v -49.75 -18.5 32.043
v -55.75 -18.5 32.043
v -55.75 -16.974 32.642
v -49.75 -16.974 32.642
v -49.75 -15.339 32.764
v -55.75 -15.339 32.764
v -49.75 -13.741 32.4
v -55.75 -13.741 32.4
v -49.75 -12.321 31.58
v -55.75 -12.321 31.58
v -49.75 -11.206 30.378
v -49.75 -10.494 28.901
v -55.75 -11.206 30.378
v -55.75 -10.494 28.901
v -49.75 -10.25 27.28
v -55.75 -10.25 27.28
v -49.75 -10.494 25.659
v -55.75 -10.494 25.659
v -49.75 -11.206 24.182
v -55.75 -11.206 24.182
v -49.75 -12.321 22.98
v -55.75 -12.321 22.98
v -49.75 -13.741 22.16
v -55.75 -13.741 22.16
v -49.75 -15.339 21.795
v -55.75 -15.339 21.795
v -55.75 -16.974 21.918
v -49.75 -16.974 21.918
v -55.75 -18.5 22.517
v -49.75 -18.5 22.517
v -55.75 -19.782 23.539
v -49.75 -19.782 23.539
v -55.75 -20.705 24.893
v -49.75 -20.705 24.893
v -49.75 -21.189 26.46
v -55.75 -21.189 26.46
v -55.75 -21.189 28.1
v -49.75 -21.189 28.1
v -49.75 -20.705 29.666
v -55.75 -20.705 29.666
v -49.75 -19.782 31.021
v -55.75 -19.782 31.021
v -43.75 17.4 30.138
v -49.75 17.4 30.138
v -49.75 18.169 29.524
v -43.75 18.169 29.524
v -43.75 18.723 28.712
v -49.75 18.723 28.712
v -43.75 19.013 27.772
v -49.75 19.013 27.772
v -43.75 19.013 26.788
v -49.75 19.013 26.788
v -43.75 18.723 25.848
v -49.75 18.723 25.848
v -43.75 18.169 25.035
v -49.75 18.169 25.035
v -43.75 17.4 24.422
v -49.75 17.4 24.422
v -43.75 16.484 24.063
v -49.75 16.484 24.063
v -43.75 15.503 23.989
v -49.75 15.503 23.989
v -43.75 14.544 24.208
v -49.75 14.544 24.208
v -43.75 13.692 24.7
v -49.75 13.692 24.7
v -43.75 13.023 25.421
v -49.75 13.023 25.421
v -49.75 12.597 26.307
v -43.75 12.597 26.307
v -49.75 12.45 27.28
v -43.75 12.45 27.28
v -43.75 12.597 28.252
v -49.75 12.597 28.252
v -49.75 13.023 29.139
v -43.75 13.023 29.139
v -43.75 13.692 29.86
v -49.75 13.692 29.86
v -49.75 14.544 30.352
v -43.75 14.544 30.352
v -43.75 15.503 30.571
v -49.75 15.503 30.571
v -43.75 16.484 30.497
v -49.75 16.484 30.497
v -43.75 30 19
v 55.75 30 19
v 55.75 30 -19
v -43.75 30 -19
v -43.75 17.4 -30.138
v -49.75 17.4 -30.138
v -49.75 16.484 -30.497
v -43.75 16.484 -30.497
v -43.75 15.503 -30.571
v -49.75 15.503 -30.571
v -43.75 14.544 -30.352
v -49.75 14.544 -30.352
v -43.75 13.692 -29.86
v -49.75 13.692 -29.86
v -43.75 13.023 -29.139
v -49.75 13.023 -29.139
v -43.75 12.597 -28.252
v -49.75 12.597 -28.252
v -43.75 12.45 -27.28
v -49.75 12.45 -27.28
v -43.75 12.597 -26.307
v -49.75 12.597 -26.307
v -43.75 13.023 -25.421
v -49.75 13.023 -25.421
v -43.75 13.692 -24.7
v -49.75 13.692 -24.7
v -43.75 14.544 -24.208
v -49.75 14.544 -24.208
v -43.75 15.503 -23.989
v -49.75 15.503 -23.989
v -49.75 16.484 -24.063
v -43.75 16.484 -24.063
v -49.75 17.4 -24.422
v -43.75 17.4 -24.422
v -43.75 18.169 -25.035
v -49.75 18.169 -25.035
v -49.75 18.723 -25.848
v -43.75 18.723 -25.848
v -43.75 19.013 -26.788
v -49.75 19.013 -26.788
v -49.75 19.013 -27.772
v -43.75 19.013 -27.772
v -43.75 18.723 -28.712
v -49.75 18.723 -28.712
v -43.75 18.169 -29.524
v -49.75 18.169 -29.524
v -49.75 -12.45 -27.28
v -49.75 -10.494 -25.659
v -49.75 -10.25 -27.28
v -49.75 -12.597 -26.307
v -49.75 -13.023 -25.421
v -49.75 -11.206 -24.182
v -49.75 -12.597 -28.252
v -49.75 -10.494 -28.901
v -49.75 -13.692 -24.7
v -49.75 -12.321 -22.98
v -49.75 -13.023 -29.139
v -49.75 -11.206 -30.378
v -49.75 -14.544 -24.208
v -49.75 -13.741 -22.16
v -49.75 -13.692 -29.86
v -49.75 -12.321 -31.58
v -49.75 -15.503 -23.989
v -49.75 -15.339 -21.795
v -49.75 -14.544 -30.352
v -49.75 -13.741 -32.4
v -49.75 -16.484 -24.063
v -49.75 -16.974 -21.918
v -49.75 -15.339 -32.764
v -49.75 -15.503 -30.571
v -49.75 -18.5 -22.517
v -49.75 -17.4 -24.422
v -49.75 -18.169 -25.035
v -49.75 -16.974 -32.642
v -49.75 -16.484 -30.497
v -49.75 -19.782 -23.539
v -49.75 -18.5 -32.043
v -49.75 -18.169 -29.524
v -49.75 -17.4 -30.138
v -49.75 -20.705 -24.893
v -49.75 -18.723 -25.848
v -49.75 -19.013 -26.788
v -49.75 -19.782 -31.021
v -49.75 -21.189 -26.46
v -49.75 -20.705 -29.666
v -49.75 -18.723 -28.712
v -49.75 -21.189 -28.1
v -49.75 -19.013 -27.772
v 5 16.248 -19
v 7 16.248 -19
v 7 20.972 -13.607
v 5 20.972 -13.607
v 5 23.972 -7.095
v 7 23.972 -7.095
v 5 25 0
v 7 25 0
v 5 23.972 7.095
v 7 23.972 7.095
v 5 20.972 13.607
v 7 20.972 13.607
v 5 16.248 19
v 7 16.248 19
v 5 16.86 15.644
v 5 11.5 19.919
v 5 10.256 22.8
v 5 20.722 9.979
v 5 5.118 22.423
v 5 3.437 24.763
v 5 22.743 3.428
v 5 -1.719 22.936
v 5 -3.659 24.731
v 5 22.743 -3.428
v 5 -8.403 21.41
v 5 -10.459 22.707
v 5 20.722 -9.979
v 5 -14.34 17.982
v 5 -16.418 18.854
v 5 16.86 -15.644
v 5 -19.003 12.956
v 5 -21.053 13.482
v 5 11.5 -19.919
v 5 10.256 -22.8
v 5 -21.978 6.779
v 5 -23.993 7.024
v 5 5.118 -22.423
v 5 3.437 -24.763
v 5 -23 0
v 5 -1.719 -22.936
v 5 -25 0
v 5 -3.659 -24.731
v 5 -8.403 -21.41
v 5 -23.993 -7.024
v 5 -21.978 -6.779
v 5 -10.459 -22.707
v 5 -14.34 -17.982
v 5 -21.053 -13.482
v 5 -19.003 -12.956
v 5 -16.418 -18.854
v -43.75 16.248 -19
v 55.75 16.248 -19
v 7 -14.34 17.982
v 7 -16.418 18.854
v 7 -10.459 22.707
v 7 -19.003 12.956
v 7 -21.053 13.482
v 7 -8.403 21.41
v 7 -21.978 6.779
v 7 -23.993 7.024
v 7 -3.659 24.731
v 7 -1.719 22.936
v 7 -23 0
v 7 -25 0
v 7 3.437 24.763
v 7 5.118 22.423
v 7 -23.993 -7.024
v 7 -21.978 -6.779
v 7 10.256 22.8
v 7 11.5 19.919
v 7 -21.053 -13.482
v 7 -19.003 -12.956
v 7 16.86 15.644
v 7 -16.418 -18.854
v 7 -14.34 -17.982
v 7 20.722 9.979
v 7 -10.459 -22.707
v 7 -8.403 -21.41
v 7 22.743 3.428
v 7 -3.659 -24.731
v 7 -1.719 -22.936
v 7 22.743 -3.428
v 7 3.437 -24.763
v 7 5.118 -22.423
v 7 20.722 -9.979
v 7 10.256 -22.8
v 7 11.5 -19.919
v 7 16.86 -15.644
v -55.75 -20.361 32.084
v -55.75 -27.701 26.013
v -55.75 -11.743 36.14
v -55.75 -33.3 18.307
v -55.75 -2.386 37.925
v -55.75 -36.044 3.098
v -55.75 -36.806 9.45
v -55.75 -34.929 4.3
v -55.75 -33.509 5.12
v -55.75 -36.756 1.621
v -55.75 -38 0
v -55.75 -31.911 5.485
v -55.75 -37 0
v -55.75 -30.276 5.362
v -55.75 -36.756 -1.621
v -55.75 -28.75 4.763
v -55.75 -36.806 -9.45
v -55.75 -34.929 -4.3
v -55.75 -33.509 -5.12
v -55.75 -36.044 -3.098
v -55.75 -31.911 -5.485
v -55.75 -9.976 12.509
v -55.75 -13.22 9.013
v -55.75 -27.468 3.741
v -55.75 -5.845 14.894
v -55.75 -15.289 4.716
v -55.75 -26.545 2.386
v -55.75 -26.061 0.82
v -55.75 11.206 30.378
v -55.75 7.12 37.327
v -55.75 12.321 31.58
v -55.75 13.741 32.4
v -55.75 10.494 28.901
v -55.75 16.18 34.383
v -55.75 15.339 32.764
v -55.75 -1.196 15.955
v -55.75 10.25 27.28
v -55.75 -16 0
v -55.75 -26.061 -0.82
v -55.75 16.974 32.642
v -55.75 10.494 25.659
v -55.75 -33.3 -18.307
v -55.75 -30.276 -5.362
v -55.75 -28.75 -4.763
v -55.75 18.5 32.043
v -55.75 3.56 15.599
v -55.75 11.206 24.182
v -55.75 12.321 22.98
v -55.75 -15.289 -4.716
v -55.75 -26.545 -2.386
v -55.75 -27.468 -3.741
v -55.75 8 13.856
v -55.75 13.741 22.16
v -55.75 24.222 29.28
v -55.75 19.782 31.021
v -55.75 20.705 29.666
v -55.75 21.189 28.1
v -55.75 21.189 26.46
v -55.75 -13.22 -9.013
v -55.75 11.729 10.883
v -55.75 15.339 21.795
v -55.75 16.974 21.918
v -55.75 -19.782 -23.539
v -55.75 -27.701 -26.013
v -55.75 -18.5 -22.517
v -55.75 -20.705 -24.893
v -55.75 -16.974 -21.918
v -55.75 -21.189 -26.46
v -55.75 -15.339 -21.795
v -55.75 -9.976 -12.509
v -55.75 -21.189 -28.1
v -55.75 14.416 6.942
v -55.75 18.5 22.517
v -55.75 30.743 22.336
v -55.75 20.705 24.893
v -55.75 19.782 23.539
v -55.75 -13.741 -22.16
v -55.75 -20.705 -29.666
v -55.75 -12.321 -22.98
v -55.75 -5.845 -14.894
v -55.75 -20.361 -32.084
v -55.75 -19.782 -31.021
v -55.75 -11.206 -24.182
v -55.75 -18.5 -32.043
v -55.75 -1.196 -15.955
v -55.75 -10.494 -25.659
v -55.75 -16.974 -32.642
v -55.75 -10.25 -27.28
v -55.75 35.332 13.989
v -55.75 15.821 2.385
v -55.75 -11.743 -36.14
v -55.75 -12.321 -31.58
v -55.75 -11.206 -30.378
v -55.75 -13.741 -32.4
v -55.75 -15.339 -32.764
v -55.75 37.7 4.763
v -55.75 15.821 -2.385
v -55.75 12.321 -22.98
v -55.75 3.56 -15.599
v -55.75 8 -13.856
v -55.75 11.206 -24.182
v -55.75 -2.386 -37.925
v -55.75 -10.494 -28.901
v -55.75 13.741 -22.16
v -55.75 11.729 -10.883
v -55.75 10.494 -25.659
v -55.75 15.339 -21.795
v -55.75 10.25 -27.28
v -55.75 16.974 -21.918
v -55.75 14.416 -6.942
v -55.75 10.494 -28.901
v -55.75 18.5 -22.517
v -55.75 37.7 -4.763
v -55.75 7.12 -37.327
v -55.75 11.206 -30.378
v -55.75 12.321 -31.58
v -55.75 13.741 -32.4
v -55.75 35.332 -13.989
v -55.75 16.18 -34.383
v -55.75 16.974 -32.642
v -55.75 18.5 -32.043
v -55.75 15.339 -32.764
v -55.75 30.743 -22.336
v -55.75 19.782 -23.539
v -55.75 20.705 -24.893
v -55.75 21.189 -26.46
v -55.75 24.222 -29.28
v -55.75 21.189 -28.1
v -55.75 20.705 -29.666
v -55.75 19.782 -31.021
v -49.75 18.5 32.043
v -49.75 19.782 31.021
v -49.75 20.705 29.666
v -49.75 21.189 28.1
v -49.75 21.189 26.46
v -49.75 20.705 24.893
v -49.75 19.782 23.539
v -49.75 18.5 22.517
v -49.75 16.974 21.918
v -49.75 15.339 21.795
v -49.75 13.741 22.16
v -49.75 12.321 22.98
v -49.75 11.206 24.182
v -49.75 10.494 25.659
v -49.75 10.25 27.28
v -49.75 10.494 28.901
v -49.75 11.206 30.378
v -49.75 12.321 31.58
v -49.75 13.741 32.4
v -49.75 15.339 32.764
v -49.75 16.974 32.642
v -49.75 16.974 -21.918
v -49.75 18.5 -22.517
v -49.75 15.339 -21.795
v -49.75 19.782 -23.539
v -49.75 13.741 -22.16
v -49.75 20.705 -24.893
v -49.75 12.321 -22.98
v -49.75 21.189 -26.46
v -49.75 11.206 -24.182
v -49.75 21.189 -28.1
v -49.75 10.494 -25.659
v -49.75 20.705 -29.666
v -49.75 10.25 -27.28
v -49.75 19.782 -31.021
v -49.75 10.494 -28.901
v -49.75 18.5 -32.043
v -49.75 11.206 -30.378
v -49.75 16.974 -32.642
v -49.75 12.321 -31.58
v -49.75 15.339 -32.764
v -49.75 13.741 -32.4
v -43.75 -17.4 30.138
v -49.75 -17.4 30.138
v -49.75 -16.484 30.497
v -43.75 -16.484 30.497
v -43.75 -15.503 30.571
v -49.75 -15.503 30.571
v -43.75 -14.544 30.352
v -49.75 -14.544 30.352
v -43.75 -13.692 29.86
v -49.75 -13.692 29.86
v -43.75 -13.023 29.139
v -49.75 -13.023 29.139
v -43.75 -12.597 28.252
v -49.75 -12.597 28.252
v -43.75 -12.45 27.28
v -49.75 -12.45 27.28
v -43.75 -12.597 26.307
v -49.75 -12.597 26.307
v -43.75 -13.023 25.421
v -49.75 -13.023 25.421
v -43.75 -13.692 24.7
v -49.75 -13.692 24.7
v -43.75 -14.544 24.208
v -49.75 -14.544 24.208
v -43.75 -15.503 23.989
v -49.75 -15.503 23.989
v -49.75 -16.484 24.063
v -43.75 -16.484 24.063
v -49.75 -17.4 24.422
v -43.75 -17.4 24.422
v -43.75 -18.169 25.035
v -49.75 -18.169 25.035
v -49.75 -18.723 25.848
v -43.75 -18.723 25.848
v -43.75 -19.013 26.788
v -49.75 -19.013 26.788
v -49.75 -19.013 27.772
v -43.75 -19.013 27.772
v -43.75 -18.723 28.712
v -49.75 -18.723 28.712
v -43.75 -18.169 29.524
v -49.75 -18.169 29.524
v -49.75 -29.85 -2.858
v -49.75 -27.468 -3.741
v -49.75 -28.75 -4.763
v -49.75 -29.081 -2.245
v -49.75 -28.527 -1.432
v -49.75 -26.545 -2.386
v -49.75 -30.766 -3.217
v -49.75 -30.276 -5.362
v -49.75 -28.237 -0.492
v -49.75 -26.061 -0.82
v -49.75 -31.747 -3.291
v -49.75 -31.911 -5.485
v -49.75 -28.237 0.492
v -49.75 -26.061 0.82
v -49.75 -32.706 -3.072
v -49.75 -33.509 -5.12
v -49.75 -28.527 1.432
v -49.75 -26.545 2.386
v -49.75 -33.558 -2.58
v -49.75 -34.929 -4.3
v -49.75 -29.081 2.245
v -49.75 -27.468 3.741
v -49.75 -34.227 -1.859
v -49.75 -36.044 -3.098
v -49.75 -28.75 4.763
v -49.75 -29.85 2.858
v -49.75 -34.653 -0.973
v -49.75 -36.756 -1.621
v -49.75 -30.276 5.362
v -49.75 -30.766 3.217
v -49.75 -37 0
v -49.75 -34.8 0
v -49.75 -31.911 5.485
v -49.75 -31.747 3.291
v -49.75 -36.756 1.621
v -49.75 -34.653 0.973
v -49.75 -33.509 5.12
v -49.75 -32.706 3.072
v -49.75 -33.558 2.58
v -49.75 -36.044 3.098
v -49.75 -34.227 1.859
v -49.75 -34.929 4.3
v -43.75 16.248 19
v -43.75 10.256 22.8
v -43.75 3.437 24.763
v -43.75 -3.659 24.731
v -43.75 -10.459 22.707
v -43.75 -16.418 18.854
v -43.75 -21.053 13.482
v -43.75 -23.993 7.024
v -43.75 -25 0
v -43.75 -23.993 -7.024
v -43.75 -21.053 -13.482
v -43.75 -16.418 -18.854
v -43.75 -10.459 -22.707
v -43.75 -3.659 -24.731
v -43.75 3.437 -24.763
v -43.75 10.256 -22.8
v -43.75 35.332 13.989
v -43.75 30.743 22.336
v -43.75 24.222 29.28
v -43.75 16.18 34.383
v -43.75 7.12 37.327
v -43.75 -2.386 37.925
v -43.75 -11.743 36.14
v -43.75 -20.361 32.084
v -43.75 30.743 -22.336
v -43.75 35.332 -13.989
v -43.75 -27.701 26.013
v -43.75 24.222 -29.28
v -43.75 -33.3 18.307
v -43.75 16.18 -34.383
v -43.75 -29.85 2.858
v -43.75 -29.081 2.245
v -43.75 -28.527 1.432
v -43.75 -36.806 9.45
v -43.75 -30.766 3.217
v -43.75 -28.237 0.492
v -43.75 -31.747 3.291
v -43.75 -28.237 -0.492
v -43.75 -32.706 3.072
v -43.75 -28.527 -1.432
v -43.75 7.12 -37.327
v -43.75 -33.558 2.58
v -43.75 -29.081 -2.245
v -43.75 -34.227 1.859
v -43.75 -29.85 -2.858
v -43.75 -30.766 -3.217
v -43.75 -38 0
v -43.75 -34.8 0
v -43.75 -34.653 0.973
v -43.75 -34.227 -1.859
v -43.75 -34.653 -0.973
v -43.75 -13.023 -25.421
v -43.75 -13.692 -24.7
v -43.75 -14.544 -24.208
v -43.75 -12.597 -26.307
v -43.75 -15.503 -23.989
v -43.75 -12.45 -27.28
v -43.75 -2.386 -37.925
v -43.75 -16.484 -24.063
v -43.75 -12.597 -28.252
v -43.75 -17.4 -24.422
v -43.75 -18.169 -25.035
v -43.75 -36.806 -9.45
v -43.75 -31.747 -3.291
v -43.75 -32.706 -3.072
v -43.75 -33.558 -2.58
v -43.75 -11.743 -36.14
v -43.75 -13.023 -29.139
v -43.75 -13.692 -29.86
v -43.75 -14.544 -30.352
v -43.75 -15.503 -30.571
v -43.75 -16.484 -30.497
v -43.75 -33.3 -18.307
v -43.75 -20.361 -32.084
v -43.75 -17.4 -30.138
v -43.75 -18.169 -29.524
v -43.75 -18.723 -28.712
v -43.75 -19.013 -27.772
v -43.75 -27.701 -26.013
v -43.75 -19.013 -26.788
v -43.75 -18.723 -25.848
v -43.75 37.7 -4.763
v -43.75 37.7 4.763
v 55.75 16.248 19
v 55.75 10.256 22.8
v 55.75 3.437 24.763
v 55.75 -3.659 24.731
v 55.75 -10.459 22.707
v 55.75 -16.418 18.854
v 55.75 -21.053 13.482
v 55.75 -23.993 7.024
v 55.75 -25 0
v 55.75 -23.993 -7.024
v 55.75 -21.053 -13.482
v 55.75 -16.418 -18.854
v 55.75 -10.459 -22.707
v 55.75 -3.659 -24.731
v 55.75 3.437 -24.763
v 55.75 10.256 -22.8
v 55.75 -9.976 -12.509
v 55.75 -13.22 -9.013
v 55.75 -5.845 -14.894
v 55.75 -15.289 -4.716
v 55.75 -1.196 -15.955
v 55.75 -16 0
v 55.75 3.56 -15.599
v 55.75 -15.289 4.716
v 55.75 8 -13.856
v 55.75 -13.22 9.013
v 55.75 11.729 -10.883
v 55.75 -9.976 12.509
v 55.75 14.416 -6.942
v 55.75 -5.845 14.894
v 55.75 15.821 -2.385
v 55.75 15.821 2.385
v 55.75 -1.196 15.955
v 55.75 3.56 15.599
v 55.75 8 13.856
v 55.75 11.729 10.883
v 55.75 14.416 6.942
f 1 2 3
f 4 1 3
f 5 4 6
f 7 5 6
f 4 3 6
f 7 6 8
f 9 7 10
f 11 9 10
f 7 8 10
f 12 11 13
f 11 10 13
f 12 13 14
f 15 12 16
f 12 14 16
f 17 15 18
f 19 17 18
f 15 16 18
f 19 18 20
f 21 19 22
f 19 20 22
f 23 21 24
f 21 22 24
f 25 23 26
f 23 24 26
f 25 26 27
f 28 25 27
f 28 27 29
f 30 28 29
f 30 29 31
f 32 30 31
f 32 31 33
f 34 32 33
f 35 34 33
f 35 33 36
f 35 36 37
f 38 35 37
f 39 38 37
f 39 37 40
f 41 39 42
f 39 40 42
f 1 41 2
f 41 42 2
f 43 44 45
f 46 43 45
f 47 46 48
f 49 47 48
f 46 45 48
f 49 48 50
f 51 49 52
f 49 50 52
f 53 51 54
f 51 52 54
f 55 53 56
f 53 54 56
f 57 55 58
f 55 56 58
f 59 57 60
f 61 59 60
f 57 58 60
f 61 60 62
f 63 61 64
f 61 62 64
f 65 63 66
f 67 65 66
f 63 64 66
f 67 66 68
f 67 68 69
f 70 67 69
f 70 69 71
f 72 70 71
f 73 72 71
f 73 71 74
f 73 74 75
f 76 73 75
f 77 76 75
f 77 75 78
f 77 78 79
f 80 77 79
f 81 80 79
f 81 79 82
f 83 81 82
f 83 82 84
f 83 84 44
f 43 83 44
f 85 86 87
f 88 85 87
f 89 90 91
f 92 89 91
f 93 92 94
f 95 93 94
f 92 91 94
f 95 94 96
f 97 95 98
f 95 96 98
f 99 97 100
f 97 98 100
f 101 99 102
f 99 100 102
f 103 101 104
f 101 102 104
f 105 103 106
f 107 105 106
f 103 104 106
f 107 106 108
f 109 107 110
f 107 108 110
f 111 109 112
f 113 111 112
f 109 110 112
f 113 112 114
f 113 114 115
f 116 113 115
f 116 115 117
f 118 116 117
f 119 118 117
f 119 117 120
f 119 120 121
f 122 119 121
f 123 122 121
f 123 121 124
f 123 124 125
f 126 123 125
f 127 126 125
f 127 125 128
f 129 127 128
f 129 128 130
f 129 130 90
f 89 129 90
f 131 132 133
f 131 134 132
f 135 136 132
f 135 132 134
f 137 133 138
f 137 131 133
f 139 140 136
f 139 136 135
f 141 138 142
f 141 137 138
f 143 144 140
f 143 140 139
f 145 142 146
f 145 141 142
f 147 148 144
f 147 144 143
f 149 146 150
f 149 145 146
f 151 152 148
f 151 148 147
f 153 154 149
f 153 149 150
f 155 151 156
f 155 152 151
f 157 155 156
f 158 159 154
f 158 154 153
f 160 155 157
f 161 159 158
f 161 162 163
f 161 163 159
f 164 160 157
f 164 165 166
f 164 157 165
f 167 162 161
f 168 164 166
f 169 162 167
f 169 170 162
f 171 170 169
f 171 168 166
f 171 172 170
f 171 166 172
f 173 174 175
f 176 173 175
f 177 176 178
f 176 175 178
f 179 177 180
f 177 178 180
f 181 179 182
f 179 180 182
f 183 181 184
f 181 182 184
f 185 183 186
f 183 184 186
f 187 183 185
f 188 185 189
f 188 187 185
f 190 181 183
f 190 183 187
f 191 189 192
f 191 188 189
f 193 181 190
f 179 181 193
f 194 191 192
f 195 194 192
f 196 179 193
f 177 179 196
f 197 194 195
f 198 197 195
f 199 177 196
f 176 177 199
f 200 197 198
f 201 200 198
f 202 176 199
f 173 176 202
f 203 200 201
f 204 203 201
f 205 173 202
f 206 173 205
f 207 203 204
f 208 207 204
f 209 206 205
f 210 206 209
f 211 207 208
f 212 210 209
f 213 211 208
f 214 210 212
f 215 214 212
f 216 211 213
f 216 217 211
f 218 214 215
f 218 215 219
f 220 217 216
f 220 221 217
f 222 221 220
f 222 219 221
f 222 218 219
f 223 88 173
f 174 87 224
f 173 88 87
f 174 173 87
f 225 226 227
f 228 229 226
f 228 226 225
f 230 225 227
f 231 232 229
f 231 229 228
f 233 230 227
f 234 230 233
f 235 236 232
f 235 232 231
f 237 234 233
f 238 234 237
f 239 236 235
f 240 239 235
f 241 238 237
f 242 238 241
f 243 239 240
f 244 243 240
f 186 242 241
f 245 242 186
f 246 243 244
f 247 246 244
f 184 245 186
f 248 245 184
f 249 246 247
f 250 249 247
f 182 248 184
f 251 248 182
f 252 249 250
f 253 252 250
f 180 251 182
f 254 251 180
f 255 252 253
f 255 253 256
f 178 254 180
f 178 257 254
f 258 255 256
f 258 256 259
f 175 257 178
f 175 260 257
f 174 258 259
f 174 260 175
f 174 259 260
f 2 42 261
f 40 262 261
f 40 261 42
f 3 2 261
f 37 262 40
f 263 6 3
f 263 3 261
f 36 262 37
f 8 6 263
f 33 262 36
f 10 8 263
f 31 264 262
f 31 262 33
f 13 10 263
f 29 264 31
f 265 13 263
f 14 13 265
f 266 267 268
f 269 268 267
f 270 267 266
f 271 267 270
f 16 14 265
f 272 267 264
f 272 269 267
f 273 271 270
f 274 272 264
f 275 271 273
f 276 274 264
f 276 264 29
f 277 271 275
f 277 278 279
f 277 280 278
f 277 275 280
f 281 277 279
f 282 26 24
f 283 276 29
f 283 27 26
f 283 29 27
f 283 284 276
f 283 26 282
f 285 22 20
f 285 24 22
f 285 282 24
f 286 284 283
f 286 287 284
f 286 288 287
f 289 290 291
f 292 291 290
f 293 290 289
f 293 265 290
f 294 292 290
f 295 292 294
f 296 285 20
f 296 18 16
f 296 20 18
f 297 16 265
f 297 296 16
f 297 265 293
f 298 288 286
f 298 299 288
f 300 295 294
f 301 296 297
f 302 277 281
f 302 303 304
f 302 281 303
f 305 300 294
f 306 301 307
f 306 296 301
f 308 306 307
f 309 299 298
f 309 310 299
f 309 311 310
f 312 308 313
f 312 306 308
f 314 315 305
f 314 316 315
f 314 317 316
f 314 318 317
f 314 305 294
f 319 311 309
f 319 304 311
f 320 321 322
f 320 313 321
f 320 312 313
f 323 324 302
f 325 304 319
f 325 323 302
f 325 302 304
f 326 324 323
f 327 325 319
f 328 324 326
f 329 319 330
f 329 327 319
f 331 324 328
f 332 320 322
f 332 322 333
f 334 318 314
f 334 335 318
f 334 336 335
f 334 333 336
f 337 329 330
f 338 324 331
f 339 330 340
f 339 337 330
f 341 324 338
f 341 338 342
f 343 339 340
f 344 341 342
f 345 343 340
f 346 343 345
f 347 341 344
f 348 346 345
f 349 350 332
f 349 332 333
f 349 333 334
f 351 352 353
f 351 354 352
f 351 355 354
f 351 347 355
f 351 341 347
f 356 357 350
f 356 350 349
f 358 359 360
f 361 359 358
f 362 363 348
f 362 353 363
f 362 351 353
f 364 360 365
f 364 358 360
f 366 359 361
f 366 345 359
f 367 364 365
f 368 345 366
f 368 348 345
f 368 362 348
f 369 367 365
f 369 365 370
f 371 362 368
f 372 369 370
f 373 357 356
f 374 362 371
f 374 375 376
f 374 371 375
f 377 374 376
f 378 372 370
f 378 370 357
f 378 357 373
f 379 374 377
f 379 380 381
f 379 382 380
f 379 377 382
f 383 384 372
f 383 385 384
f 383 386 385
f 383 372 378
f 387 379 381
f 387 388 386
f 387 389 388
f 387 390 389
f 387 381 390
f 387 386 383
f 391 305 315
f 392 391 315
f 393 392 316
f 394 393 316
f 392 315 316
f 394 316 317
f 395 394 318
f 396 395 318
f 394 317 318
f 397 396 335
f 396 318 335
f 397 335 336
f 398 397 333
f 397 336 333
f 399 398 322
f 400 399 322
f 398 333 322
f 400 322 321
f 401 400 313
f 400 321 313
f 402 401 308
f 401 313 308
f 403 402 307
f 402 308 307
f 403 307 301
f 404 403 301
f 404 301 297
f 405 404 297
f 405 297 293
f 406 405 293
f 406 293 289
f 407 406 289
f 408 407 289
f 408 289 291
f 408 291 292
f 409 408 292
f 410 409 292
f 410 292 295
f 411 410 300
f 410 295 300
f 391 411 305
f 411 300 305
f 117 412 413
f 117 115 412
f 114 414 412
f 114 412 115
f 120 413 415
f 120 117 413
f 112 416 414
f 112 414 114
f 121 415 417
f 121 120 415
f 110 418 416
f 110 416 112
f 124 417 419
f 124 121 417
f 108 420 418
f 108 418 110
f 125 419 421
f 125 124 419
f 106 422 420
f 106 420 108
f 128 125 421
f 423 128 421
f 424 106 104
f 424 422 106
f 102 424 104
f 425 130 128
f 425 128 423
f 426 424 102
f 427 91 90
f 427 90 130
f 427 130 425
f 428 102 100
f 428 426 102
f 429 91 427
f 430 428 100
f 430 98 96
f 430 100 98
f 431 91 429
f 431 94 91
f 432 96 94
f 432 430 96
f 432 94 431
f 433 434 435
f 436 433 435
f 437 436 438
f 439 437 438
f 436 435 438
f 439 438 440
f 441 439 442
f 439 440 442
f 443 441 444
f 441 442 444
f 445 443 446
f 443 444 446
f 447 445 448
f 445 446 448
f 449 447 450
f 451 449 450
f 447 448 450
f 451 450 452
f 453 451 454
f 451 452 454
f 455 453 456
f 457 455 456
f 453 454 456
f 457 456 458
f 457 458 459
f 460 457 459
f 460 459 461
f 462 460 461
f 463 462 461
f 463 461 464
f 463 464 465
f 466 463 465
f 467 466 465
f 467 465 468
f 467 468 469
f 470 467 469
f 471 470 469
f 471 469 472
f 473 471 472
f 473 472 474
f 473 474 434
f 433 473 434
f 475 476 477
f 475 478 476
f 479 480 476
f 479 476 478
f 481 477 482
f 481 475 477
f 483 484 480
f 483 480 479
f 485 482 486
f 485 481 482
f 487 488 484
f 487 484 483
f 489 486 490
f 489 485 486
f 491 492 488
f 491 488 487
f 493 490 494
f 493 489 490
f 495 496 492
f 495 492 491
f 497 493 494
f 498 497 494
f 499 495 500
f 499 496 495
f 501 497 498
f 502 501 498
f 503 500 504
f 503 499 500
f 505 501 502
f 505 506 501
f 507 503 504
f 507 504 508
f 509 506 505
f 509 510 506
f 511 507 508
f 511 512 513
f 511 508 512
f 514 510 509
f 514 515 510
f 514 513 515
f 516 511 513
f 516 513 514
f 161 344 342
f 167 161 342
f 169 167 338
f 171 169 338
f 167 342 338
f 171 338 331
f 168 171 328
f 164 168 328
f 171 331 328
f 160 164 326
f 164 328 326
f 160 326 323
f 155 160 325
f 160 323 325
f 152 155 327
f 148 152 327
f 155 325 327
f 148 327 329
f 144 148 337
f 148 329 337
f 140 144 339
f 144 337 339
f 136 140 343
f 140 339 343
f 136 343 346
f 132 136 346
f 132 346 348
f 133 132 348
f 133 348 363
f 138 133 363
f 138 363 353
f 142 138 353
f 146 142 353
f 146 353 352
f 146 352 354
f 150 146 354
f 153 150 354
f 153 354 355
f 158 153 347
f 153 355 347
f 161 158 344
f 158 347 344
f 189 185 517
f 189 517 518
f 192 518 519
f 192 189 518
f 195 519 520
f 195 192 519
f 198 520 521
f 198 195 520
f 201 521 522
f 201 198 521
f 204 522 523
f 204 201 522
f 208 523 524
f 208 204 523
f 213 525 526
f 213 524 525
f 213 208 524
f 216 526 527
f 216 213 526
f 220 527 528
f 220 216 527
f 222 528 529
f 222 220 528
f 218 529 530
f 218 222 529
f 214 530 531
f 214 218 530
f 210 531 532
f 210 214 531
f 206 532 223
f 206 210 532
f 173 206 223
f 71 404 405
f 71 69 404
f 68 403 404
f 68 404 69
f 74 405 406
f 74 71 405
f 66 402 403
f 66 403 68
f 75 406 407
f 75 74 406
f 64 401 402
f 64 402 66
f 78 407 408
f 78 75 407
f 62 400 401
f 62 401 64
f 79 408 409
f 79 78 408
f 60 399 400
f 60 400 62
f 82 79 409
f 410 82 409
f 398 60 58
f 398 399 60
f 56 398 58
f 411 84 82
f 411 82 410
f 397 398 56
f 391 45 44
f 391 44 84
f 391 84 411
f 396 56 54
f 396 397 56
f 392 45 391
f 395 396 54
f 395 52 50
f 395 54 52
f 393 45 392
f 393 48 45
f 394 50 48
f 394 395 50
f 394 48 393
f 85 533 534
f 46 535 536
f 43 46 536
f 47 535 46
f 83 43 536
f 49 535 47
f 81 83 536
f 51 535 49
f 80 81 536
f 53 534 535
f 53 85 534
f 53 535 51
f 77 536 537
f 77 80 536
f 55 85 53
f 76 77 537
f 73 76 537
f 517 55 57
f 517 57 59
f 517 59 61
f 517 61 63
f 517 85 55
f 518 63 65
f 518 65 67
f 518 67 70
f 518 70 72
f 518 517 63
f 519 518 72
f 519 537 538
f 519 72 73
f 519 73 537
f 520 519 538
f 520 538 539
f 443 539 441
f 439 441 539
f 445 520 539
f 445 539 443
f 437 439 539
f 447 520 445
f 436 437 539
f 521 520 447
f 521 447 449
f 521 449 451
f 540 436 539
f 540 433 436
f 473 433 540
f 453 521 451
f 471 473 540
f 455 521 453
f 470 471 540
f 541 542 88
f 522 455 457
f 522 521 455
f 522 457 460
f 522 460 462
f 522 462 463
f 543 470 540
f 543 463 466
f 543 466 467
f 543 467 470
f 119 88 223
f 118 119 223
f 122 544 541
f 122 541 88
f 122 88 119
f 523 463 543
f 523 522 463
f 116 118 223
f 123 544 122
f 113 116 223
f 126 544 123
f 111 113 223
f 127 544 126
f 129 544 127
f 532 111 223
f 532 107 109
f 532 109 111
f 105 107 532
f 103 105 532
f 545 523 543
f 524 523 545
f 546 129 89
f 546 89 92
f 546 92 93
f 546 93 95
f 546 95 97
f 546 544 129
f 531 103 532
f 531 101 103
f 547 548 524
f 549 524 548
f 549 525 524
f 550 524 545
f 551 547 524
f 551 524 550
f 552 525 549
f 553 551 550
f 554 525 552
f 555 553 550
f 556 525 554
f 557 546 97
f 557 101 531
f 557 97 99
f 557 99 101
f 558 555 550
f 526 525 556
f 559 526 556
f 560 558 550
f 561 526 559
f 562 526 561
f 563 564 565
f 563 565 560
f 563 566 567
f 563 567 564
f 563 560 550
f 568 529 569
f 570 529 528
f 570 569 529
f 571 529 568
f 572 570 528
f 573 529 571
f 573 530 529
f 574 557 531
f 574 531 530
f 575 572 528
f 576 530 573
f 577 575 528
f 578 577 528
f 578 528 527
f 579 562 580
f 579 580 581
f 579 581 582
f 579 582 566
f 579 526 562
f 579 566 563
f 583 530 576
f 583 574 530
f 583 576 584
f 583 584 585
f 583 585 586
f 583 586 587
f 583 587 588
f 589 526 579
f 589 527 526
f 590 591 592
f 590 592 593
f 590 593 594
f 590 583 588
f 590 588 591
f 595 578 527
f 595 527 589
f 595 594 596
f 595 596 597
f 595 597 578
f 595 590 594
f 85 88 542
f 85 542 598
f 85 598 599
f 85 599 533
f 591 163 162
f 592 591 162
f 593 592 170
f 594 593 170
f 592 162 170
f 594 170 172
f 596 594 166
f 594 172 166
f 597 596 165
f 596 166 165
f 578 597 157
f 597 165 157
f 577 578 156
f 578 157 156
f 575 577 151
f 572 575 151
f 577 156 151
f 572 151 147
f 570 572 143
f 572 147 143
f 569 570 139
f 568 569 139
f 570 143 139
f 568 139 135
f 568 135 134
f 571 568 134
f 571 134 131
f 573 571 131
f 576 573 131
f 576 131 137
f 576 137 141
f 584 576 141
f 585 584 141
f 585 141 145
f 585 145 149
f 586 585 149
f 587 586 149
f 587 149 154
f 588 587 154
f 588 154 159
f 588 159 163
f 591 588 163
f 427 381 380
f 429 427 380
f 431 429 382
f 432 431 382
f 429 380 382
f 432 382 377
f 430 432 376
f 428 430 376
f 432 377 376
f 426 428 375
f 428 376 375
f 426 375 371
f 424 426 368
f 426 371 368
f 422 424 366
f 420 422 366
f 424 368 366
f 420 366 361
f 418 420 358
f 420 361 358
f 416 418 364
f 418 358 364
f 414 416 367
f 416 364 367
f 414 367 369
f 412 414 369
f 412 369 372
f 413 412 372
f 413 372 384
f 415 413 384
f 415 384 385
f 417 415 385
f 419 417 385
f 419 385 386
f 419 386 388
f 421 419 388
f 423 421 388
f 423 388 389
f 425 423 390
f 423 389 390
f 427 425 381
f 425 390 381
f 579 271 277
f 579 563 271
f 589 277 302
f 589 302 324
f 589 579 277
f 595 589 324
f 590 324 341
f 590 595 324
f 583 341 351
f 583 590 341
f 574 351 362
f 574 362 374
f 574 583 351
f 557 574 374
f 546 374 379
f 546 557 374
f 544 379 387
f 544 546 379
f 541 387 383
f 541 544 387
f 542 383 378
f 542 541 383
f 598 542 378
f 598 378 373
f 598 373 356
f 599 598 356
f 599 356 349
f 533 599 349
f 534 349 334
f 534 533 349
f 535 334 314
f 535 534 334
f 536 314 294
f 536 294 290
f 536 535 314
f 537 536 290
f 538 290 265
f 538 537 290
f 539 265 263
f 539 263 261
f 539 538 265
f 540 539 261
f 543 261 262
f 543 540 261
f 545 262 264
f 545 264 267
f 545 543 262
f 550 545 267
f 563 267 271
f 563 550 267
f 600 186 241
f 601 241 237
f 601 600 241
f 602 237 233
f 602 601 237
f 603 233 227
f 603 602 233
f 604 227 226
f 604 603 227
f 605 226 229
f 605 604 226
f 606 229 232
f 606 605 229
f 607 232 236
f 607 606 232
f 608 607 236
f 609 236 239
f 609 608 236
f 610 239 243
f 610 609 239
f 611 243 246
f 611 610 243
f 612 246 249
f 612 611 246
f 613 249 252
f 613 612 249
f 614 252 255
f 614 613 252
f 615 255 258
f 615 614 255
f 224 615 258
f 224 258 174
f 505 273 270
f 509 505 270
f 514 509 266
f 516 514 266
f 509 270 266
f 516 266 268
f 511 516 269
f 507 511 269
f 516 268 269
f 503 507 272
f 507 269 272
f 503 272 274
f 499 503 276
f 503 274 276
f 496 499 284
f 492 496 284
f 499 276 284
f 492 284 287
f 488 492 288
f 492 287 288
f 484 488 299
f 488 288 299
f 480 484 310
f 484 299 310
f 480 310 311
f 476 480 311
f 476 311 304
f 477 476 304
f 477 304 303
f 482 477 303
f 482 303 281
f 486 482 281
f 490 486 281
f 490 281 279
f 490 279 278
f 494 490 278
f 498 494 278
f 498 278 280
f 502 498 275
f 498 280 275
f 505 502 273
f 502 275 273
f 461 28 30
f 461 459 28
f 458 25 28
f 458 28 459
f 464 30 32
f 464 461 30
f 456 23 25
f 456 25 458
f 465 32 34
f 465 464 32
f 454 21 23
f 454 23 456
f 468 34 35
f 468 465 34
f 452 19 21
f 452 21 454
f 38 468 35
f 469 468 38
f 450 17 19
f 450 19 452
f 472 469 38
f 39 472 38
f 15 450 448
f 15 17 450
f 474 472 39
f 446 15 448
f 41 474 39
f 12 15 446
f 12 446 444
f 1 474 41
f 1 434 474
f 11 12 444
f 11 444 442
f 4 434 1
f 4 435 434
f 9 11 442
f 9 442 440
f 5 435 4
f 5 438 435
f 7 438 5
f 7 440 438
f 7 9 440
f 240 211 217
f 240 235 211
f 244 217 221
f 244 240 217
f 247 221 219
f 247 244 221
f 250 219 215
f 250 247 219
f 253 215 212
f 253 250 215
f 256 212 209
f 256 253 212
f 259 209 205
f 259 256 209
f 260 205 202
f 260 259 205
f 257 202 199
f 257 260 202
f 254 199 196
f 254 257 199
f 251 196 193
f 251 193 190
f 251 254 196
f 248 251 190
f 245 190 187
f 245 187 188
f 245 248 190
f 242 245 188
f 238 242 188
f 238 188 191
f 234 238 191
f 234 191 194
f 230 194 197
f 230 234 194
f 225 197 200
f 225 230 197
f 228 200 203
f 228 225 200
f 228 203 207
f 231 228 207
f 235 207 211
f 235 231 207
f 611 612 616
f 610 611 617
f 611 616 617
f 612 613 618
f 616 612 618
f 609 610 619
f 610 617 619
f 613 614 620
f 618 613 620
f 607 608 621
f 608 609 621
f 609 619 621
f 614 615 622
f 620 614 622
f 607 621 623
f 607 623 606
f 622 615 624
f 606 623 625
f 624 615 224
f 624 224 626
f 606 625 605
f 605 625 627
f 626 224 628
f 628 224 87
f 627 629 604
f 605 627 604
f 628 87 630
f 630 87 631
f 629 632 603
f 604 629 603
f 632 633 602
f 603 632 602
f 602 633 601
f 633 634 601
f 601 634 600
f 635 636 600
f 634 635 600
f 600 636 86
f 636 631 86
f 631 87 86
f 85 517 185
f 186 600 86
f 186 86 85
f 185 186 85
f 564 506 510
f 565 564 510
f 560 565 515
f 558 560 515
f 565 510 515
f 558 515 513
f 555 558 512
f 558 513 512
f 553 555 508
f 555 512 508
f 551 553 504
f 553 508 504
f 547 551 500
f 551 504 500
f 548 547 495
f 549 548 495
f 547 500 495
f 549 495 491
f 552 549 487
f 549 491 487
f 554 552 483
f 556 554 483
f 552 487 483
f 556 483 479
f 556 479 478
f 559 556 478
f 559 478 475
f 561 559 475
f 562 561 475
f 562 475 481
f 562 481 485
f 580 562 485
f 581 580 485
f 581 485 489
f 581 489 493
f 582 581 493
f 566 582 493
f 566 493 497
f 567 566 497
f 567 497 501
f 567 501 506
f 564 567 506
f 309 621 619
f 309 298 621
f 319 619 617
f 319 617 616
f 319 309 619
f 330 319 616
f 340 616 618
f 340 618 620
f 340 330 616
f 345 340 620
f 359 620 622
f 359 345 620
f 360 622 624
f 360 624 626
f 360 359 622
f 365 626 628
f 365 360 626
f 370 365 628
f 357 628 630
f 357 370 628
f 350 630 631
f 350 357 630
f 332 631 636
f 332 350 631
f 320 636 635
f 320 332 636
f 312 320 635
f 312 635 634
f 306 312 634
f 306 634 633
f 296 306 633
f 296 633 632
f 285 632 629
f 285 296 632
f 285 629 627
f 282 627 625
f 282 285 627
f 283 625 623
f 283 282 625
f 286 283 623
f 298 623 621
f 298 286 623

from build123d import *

# Parameters (mm, degrees)
CUT_EXTRUDE1_REACH  = 125.775
SKETCH2_R           = 3.3
SKETCH3_R           = 5.5
CUT_EXTRUDE2_DEPTH  = 6
CIRPATTERN1_COUNT   = 6
BOSS_EXTRUDE1_REACH = 125.775


with BuildPart() as part:
    # Sketch1 → Revolve1 (revolve)
    with BuildSketch(Plane.XY, mode=Mode.PRIVATE) as revolve1_sk:
        Polygon((-55.75, 38), (-43.75, 38), (-43.75, 25), (5, 25), (5, 23), (7, 23), (7, 25), (55.75, 25), (55.75, 16), (-55.75, 16), align=None)
    revolve(revolve1_sk.sketch.rotate(Axis((-82.106015927, 0, 0), (1, 0, 0)), 180), axis=Axis((-82.106015927, 0, 0), (1, 0, 0)))

    # Sketch2 → Cut-Extrude1 (cut, up to next)
    with BuildSketch(Plane.ZY.offset(55.75), mode=Mode.PRIVATE) as cut_extrude1_sk1:
        with Locations(Location((0, -31.5, 0), (0, 0, 270))):
            Circle(SKETCH2_R)
    cut_extrude1_tool1 = extrude(cut_extrude1_sk1.sketch, amount=-CUT_EXTRUDE1_REACH, mode=Mode.PRIVATE) & part.part
    cut_extrude1 = cut_extrude1_tool1.solids().sort_by_distance((-55.75, -31.5, 0))[0]
    add(cut_extrude1, mode=Mode.SUBTRACT)

    # Sketch3 → Cut-Extrude2 (cut)
    with BuildSketch(Plane.ZY.offset(55.75)):
        with Locations(Location((0, -31.5, 0), (0, 0, 270))):
            Circle(SKETCH3_R)
    cut_extrude2 = extrude(amount=-CUT_EXTRUDE2_DEPTH, mode=Mode.SUBTRACT)

    # CirPattern1: Cut-Extrude1, Cut-Extrude2 ×6 about axis, 1 skipped
    cirpattern1_axis = Axis((0, 0, 0), (-1, 0, 0))
    add([cut_extrude1.rotate(cirpattern1_axis, i * 360 / CIRPATTERN1_COUNT) for i in range(1, CIRPATTERN1_COUNT) if i not in (3,)], mode=Mode.SUBTRACT)
    add([cut_extrude2.rotate(cirpattern1_axis, i * 360 / CIRPATTERN1_COUNT) for i in range(1, CIRPATTERN1_COUNT) if i not in (3,)], mode=Mode.SUBTRACT)

    # Boss-Extrude1: up to this face of the body (flat: up to its plane)
    boss_extrude1_end = Plane(part.part.faces().sort_by_distance((-43.75, 36.925197693, 0))[0])
    # Sketch5 → Boss-Extrude1 (add, up to the picked face)
    with BuildSketch(Plane(origin=(55.75, 0, 0), x_dir=(0, 0, -1), z_dir=(1, 0, 0)), mode=Mode.PRIVATE) as boss_extrude1_sk1:
        with BuildLine():
            Line((-19, 30), (19, 30))
            Line((19, 30), (19, 16.248076809))
            ThreePointArc((19, 16.248076809), (0, 25), (-19, 16.248076809))
            Line((-19, 16.248076809), (-19, 30))
        make_face()
    boss_extrude1_tool1 = split(extrude(boss_extrude1_sk1.sketch, amount=-BOSS_EXTRUDE1_REACH, mode=Mode.PRIVATE), bisect_by=boss_extrude1_end, keep=Keep.BOTH, mode=Mode.PRIVATE)
    add(boss_extrude1_tool1.solids().sort_by(Axis((55.75, 25.748801, 0), (-1, 0, 0)))[0])


solid = part.part
